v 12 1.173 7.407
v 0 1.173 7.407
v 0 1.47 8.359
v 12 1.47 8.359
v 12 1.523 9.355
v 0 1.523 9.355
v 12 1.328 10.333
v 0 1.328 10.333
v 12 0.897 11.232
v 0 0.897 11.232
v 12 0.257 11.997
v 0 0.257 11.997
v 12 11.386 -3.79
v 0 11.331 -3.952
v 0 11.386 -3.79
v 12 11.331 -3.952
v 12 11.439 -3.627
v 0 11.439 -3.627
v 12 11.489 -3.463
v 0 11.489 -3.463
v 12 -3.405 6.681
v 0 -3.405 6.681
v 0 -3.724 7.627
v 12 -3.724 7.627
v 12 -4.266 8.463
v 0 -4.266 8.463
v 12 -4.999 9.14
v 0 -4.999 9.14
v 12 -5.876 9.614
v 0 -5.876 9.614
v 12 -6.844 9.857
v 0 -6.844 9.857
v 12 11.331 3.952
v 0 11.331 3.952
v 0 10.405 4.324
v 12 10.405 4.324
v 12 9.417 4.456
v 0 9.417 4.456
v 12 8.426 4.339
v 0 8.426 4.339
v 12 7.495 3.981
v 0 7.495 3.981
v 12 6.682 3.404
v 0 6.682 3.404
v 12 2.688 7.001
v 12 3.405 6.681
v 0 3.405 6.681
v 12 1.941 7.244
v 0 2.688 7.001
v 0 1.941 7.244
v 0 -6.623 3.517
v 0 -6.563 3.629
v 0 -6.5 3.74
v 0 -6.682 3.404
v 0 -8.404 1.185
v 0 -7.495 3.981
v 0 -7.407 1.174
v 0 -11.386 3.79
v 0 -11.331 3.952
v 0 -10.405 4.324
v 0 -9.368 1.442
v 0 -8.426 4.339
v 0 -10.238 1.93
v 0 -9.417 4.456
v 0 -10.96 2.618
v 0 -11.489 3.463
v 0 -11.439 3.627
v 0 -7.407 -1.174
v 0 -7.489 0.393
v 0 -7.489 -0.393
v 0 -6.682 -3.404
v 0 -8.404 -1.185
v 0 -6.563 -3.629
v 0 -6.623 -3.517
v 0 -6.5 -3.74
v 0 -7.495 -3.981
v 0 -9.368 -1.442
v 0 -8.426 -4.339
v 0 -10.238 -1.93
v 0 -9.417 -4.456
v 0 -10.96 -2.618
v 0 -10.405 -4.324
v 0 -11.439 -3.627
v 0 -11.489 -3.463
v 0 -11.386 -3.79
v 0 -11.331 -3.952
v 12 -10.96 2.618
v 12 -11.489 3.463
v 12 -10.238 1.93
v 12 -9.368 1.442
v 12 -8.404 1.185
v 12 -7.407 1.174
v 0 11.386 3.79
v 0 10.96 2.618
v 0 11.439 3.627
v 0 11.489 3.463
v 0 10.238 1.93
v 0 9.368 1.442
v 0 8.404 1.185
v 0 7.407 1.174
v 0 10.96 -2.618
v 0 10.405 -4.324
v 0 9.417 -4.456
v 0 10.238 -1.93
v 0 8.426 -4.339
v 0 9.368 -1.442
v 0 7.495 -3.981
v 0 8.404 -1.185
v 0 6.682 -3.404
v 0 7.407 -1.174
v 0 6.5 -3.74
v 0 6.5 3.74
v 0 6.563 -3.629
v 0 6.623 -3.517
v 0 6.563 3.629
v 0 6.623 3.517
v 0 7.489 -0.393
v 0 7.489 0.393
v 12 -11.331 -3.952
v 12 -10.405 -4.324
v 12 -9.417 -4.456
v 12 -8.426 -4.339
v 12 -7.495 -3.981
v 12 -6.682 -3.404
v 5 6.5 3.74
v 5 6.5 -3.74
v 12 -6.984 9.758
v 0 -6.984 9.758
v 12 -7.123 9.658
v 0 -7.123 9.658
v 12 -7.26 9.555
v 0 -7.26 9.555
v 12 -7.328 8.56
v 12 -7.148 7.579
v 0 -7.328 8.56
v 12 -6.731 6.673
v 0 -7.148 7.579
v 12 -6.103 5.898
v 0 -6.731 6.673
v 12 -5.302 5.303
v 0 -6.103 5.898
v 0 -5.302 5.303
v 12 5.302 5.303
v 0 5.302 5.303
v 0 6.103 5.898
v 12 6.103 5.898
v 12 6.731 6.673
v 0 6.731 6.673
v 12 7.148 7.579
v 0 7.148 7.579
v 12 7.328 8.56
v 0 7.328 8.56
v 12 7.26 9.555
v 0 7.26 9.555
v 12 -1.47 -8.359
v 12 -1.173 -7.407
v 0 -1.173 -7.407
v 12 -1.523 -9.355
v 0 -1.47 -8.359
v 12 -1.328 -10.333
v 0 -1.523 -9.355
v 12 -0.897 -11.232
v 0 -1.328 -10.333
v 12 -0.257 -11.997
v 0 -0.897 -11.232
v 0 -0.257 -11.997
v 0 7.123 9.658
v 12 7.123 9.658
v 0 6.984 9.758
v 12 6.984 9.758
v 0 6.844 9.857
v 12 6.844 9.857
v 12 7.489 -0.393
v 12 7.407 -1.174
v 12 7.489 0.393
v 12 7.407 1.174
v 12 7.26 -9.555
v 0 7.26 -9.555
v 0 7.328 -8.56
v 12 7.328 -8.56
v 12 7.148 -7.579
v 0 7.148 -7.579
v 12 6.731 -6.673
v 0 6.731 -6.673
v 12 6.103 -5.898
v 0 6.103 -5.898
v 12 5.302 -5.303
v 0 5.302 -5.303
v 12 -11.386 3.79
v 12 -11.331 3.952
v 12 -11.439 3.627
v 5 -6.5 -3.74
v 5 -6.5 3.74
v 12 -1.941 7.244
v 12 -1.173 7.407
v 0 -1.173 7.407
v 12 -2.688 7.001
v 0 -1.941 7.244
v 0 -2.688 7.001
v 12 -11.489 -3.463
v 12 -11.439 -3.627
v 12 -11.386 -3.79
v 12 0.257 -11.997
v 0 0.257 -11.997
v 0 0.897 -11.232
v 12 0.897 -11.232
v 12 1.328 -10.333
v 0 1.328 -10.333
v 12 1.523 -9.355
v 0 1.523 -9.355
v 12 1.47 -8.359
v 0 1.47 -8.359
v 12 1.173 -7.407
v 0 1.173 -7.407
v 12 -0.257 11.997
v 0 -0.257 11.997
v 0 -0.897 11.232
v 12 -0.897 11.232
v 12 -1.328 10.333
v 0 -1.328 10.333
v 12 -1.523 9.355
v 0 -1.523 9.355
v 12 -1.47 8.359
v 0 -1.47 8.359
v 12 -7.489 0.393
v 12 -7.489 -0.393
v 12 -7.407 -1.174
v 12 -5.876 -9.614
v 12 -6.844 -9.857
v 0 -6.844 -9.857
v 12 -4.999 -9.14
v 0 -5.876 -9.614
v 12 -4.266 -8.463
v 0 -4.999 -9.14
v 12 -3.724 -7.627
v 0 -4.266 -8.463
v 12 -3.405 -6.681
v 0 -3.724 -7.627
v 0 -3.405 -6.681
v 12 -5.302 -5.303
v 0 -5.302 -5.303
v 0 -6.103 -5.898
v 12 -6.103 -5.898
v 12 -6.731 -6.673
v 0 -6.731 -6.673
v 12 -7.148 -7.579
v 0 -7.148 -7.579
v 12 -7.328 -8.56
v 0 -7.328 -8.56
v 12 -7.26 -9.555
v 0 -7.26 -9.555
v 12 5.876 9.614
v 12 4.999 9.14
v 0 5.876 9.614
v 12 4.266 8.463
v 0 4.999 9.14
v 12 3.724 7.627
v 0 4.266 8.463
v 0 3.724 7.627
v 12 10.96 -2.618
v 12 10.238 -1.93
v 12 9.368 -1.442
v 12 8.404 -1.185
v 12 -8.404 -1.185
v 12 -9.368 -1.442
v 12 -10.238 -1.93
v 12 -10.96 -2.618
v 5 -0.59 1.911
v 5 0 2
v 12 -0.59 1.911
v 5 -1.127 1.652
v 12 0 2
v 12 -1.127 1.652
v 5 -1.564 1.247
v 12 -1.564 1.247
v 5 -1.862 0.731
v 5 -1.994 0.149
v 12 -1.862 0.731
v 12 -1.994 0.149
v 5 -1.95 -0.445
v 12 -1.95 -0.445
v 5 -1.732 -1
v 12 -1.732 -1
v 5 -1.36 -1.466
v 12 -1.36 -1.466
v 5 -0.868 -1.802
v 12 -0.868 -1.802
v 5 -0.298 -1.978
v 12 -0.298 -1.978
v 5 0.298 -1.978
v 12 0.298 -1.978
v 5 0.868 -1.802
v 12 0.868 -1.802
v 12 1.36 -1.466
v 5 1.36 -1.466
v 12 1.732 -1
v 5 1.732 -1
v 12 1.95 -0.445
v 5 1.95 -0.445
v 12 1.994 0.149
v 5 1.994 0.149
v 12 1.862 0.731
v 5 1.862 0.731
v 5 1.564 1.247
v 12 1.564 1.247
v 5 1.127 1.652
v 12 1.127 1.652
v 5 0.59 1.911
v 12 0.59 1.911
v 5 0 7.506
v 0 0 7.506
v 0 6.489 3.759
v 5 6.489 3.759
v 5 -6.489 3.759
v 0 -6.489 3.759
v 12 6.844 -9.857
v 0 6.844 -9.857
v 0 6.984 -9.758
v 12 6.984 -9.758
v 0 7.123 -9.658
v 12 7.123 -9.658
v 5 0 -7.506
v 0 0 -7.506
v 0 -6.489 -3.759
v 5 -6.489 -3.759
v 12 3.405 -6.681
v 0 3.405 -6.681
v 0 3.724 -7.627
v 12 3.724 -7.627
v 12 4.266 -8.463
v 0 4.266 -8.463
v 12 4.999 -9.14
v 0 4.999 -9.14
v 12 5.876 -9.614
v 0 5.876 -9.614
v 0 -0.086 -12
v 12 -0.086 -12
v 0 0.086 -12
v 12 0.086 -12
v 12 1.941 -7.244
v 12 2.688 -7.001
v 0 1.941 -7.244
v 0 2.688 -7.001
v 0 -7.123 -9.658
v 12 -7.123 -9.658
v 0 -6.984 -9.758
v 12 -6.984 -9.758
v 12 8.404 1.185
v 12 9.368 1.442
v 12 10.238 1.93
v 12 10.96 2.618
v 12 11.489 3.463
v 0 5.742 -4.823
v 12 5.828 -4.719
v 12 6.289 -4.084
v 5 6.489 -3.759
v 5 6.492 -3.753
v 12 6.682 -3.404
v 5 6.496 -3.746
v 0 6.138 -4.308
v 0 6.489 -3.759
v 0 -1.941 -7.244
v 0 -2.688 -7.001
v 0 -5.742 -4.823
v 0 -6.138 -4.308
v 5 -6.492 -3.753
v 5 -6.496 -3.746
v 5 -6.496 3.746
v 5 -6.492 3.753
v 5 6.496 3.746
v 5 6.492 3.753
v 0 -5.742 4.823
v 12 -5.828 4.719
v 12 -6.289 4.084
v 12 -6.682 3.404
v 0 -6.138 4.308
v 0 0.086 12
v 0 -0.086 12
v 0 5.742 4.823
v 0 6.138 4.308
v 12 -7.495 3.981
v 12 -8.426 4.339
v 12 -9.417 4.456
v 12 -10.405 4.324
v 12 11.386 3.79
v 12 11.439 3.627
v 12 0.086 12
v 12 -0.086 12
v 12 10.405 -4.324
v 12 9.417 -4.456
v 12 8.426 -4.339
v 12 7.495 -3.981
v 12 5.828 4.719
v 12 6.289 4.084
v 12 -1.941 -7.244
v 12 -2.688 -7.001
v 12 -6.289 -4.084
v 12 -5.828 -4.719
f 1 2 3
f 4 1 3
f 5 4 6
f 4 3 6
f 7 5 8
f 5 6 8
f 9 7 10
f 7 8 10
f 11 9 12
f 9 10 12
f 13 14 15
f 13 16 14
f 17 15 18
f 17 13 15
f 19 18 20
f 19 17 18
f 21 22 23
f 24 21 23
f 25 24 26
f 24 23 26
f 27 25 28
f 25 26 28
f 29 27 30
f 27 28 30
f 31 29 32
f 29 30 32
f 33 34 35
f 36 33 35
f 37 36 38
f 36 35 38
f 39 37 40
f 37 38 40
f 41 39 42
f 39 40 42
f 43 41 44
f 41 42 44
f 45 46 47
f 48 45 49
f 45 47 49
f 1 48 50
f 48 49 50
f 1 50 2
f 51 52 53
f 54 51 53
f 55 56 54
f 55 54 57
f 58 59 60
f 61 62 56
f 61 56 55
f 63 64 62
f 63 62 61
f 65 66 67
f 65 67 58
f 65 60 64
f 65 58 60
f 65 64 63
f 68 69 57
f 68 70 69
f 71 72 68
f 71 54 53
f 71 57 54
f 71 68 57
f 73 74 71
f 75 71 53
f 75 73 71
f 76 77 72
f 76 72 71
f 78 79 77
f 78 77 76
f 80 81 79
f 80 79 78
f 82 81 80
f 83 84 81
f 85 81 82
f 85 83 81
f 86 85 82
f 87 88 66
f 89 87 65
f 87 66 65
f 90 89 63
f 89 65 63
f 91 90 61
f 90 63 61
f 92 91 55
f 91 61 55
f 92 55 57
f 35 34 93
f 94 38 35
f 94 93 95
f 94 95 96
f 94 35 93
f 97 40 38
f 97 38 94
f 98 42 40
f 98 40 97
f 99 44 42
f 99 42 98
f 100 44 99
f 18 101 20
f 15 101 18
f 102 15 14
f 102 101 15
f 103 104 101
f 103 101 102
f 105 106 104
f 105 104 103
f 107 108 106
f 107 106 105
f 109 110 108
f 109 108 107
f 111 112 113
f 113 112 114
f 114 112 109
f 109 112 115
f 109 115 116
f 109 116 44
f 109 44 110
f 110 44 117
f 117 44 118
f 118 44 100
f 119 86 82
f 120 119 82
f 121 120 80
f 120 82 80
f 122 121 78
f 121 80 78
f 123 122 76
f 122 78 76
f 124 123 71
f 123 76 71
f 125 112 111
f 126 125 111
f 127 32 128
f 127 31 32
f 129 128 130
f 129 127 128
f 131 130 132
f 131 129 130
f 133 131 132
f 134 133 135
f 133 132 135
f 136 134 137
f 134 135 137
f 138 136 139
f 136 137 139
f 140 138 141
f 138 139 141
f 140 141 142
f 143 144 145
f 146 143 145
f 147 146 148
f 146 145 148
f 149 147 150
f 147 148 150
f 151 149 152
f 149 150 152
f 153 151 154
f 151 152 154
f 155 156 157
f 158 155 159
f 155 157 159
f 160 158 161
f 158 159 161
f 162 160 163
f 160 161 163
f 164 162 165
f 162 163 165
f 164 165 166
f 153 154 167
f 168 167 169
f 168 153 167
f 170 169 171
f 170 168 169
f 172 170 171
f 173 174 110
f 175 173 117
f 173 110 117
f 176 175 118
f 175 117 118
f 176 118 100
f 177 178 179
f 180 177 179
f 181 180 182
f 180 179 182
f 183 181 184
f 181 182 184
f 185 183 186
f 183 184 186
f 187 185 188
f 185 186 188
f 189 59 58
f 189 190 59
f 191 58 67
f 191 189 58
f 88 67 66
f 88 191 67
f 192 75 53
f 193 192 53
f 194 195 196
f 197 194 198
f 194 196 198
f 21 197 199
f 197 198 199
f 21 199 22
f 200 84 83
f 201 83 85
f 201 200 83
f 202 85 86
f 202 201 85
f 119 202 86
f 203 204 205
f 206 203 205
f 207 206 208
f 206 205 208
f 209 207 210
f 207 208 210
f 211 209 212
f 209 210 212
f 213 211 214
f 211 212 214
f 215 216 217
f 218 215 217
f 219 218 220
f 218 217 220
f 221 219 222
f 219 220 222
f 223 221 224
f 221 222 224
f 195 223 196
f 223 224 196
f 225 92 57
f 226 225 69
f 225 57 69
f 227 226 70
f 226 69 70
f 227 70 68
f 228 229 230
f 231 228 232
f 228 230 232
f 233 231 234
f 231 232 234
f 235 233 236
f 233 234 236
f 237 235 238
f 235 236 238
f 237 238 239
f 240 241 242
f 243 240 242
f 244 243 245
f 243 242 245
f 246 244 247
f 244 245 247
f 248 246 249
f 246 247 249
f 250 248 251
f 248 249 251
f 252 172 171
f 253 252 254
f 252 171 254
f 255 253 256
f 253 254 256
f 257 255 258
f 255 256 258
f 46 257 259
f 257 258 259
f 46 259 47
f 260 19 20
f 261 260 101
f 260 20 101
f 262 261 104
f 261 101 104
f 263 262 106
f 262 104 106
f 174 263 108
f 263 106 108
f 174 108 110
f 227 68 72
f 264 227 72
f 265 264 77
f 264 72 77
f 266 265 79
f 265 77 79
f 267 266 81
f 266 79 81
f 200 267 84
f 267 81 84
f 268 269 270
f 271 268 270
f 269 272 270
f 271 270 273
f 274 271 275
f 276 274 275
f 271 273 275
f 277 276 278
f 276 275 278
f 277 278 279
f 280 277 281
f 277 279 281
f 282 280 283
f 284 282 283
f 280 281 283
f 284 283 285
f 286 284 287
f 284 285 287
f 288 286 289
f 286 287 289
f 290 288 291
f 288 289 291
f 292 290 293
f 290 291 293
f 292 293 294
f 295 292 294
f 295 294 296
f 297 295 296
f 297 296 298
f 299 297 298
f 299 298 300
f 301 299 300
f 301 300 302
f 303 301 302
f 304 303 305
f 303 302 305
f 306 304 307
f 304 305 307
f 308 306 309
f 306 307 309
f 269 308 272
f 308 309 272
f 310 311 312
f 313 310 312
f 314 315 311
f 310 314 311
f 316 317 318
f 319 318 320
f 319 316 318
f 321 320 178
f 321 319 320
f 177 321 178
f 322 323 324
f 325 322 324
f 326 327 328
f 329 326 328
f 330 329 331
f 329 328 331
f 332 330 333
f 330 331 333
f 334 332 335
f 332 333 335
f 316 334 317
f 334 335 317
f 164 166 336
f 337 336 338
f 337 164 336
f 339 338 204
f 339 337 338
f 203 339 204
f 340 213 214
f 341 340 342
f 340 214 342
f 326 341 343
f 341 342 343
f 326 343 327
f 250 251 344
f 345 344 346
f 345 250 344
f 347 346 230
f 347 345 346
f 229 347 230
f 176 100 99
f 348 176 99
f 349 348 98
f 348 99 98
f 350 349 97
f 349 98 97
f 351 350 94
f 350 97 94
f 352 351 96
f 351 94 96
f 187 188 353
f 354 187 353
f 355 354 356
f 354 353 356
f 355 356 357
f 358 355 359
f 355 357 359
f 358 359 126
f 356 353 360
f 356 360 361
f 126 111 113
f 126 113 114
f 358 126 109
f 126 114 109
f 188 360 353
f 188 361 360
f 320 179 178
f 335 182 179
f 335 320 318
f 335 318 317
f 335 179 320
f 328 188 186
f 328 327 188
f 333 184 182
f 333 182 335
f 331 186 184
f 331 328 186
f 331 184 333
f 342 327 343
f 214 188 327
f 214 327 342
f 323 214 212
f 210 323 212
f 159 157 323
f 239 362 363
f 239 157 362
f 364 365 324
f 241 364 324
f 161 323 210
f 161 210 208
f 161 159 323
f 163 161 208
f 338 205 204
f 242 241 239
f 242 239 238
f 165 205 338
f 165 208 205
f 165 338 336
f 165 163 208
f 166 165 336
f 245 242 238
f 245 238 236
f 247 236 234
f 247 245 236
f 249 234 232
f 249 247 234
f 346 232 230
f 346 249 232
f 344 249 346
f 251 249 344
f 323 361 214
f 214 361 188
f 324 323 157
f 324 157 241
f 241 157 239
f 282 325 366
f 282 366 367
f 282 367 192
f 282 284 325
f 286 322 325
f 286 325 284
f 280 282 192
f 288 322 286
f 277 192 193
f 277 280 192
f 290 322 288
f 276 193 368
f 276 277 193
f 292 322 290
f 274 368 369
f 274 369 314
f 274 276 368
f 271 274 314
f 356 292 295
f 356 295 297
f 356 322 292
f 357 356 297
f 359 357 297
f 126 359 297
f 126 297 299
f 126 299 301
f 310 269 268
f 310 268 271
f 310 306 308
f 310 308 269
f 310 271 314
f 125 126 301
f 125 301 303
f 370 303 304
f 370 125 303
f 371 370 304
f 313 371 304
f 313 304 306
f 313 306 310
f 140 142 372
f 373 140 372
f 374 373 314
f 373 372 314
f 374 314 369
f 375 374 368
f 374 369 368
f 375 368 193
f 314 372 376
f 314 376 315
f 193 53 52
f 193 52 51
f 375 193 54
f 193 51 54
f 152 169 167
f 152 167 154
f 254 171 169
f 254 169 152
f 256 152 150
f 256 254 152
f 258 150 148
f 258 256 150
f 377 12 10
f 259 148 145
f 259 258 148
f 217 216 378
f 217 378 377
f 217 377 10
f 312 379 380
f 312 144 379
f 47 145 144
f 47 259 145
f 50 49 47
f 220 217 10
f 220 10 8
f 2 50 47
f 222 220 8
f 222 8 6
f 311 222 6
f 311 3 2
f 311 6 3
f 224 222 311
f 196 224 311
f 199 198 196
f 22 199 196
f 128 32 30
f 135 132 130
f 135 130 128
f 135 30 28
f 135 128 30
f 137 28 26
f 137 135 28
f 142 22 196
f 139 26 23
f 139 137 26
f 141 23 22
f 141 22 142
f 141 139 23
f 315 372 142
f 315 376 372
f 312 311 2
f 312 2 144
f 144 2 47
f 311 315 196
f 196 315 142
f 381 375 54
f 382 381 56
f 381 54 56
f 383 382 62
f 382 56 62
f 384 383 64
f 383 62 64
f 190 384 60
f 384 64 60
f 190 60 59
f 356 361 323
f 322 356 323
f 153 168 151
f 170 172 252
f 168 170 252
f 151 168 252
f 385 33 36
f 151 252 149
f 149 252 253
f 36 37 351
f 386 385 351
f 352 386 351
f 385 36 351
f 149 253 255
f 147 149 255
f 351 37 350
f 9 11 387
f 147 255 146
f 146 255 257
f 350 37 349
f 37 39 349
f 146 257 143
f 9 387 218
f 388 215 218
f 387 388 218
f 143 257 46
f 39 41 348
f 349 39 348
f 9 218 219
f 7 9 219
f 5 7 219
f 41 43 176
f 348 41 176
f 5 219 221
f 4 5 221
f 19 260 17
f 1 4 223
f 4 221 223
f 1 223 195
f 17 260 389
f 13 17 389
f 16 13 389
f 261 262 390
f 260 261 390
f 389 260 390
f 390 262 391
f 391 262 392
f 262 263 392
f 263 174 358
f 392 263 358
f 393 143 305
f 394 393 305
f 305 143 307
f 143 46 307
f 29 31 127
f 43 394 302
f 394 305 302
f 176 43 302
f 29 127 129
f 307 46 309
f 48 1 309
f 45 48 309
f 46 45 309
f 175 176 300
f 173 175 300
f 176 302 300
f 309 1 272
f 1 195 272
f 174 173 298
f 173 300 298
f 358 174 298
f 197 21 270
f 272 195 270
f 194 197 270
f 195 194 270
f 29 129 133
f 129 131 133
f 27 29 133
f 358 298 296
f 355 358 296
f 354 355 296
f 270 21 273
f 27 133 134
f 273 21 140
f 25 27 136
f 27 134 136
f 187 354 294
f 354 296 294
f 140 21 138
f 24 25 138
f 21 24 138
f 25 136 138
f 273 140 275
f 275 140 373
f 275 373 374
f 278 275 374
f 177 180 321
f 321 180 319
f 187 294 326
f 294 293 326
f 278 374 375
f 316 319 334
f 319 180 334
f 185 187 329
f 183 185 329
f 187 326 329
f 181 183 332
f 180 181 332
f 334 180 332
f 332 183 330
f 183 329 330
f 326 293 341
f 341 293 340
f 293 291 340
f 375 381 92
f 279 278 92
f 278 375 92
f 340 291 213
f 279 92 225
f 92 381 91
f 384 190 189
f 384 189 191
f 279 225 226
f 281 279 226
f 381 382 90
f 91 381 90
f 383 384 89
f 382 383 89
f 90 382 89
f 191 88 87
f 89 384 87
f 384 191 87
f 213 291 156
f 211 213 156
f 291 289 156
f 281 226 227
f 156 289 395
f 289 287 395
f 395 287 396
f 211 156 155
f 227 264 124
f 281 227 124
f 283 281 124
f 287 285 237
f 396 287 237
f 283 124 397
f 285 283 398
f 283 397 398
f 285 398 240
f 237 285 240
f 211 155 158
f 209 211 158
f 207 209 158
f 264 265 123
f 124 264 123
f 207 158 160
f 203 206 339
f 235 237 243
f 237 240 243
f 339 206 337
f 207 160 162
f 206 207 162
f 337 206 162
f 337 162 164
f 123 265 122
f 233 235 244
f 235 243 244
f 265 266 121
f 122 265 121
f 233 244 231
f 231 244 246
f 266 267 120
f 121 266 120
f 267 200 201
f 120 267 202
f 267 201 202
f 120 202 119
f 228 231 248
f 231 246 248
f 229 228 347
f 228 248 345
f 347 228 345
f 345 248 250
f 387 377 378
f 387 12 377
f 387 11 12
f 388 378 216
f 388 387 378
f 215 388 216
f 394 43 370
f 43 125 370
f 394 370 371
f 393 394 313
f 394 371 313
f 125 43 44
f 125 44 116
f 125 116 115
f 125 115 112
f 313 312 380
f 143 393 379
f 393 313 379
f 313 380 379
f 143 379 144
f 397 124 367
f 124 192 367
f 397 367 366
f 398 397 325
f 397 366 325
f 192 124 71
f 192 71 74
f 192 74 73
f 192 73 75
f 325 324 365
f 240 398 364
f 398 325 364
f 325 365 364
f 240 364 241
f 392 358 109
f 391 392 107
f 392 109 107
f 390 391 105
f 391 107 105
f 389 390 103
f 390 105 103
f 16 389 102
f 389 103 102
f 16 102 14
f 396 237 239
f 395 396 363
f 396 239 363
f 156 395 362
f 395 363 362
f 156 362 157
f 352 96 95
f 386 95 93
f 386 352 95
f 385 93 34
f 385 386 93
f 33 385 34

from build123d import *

# Parameters (mm, degrees)
BASPROSKE_W         = 12
BASPROSKE_H         = 12
TOOTHCUT_DEPTH      = 21.784609691
TEETHCUTS_COUNT     = 10
TEETHCUTS_ANGLE     = 324
BORSKE_R            = 2
BORE_DEPTH          = 50.0000508
CUT_EXTRUDE_1_DEPTH = 5


with BuildPart() as part:
    # BasProSke → Base-Revolve (revolve)
    with BuildSketch(Plane(origin=(0, 0, 0), x_dir=(1, 0, 0), z_dir=(0, 1, 0)), mode=Mode.PRIVATE) as base_revolve_sk:
        with Locations((6, 6)):
            Rectangle(BASPROSKE_W, BASPROSKE_H)
    revolve(base_revolve_sk.sketch.rotate(Axis((-10, 0, 0), (1, 0, 0)), 180), axis=Axis((-10, 0, 0), (1, 0, 0)))

    # TooCutSke → ToothCut (cut, through all)
    with BuildSketch(Plane(origin=(0, 0, 0), x_dir=(0, 0, -1), z_dir=(1, 0, 0))):
        with BuildLine():
            ThreePointArc((1.173662691, 7.406586048), (0, 7.499), (-1.173662691, 7.406586048))
            ThreePointArc((-1.173662691, 7.406586048), (-1.668191438, 9.834565786), (-3.497907776, 11.50542856))
            ThreePointArc((-3.497907776, 11.50542856), (0, 12.0254), (3.497907776, 11.50542856))
            ThreePointArc((3.497907776, 11.50542856), (1.668191438, 9.834565786), (1.173662691, 7.406586048))
        make_face()
    toothcut = extrude(amount=TOOTHCUT_DEPTH, mode=Mode.SUBTRACT)

    # TeethCuts: ToothCut ×10 about axis
    teethcuts_axis = Axis((-10, 0, 0), (1, 0, 0))
    for i in range(1, TEETHCUTS_COUNT):
        add(toothcut.rotate(teethcuts_axis, i * TEETHCUTS_ANGLE / (TEETHCUTS_COUNT - 1)), mode=Mode.SUBTRACT)

    # BorSke → Bore (cut, symmetric)
    with BuildSketch(Plane(origin=(0, 0, 0), x_dir=(0, 0, -1), z_dir=(1, 0, 0))):
        with Locations(Location((0, 0, 0), (0, 0, 180))):
            Circle(BORSKE_R)
    extrude(amount=BORE_DEPTH, both=True, mode=Mode.SUBTRACT)

    # Эскиз1 → Вырез-Вытянуть1 (cut)
    with BuildSketch(Plane.ZY):
        Polygon((7.505553499, 0), (3.75277675, 6.5), (-3.75277675, 6.5), (-7.505553499, 0), (-3.75277675, -6.5), (3.75277675, -6.5), align=None)
    extrude(amount=-CUT_EXTRUDE_1_DEPTH, mode=Mode.SUBTRACT)


solid = part.part
